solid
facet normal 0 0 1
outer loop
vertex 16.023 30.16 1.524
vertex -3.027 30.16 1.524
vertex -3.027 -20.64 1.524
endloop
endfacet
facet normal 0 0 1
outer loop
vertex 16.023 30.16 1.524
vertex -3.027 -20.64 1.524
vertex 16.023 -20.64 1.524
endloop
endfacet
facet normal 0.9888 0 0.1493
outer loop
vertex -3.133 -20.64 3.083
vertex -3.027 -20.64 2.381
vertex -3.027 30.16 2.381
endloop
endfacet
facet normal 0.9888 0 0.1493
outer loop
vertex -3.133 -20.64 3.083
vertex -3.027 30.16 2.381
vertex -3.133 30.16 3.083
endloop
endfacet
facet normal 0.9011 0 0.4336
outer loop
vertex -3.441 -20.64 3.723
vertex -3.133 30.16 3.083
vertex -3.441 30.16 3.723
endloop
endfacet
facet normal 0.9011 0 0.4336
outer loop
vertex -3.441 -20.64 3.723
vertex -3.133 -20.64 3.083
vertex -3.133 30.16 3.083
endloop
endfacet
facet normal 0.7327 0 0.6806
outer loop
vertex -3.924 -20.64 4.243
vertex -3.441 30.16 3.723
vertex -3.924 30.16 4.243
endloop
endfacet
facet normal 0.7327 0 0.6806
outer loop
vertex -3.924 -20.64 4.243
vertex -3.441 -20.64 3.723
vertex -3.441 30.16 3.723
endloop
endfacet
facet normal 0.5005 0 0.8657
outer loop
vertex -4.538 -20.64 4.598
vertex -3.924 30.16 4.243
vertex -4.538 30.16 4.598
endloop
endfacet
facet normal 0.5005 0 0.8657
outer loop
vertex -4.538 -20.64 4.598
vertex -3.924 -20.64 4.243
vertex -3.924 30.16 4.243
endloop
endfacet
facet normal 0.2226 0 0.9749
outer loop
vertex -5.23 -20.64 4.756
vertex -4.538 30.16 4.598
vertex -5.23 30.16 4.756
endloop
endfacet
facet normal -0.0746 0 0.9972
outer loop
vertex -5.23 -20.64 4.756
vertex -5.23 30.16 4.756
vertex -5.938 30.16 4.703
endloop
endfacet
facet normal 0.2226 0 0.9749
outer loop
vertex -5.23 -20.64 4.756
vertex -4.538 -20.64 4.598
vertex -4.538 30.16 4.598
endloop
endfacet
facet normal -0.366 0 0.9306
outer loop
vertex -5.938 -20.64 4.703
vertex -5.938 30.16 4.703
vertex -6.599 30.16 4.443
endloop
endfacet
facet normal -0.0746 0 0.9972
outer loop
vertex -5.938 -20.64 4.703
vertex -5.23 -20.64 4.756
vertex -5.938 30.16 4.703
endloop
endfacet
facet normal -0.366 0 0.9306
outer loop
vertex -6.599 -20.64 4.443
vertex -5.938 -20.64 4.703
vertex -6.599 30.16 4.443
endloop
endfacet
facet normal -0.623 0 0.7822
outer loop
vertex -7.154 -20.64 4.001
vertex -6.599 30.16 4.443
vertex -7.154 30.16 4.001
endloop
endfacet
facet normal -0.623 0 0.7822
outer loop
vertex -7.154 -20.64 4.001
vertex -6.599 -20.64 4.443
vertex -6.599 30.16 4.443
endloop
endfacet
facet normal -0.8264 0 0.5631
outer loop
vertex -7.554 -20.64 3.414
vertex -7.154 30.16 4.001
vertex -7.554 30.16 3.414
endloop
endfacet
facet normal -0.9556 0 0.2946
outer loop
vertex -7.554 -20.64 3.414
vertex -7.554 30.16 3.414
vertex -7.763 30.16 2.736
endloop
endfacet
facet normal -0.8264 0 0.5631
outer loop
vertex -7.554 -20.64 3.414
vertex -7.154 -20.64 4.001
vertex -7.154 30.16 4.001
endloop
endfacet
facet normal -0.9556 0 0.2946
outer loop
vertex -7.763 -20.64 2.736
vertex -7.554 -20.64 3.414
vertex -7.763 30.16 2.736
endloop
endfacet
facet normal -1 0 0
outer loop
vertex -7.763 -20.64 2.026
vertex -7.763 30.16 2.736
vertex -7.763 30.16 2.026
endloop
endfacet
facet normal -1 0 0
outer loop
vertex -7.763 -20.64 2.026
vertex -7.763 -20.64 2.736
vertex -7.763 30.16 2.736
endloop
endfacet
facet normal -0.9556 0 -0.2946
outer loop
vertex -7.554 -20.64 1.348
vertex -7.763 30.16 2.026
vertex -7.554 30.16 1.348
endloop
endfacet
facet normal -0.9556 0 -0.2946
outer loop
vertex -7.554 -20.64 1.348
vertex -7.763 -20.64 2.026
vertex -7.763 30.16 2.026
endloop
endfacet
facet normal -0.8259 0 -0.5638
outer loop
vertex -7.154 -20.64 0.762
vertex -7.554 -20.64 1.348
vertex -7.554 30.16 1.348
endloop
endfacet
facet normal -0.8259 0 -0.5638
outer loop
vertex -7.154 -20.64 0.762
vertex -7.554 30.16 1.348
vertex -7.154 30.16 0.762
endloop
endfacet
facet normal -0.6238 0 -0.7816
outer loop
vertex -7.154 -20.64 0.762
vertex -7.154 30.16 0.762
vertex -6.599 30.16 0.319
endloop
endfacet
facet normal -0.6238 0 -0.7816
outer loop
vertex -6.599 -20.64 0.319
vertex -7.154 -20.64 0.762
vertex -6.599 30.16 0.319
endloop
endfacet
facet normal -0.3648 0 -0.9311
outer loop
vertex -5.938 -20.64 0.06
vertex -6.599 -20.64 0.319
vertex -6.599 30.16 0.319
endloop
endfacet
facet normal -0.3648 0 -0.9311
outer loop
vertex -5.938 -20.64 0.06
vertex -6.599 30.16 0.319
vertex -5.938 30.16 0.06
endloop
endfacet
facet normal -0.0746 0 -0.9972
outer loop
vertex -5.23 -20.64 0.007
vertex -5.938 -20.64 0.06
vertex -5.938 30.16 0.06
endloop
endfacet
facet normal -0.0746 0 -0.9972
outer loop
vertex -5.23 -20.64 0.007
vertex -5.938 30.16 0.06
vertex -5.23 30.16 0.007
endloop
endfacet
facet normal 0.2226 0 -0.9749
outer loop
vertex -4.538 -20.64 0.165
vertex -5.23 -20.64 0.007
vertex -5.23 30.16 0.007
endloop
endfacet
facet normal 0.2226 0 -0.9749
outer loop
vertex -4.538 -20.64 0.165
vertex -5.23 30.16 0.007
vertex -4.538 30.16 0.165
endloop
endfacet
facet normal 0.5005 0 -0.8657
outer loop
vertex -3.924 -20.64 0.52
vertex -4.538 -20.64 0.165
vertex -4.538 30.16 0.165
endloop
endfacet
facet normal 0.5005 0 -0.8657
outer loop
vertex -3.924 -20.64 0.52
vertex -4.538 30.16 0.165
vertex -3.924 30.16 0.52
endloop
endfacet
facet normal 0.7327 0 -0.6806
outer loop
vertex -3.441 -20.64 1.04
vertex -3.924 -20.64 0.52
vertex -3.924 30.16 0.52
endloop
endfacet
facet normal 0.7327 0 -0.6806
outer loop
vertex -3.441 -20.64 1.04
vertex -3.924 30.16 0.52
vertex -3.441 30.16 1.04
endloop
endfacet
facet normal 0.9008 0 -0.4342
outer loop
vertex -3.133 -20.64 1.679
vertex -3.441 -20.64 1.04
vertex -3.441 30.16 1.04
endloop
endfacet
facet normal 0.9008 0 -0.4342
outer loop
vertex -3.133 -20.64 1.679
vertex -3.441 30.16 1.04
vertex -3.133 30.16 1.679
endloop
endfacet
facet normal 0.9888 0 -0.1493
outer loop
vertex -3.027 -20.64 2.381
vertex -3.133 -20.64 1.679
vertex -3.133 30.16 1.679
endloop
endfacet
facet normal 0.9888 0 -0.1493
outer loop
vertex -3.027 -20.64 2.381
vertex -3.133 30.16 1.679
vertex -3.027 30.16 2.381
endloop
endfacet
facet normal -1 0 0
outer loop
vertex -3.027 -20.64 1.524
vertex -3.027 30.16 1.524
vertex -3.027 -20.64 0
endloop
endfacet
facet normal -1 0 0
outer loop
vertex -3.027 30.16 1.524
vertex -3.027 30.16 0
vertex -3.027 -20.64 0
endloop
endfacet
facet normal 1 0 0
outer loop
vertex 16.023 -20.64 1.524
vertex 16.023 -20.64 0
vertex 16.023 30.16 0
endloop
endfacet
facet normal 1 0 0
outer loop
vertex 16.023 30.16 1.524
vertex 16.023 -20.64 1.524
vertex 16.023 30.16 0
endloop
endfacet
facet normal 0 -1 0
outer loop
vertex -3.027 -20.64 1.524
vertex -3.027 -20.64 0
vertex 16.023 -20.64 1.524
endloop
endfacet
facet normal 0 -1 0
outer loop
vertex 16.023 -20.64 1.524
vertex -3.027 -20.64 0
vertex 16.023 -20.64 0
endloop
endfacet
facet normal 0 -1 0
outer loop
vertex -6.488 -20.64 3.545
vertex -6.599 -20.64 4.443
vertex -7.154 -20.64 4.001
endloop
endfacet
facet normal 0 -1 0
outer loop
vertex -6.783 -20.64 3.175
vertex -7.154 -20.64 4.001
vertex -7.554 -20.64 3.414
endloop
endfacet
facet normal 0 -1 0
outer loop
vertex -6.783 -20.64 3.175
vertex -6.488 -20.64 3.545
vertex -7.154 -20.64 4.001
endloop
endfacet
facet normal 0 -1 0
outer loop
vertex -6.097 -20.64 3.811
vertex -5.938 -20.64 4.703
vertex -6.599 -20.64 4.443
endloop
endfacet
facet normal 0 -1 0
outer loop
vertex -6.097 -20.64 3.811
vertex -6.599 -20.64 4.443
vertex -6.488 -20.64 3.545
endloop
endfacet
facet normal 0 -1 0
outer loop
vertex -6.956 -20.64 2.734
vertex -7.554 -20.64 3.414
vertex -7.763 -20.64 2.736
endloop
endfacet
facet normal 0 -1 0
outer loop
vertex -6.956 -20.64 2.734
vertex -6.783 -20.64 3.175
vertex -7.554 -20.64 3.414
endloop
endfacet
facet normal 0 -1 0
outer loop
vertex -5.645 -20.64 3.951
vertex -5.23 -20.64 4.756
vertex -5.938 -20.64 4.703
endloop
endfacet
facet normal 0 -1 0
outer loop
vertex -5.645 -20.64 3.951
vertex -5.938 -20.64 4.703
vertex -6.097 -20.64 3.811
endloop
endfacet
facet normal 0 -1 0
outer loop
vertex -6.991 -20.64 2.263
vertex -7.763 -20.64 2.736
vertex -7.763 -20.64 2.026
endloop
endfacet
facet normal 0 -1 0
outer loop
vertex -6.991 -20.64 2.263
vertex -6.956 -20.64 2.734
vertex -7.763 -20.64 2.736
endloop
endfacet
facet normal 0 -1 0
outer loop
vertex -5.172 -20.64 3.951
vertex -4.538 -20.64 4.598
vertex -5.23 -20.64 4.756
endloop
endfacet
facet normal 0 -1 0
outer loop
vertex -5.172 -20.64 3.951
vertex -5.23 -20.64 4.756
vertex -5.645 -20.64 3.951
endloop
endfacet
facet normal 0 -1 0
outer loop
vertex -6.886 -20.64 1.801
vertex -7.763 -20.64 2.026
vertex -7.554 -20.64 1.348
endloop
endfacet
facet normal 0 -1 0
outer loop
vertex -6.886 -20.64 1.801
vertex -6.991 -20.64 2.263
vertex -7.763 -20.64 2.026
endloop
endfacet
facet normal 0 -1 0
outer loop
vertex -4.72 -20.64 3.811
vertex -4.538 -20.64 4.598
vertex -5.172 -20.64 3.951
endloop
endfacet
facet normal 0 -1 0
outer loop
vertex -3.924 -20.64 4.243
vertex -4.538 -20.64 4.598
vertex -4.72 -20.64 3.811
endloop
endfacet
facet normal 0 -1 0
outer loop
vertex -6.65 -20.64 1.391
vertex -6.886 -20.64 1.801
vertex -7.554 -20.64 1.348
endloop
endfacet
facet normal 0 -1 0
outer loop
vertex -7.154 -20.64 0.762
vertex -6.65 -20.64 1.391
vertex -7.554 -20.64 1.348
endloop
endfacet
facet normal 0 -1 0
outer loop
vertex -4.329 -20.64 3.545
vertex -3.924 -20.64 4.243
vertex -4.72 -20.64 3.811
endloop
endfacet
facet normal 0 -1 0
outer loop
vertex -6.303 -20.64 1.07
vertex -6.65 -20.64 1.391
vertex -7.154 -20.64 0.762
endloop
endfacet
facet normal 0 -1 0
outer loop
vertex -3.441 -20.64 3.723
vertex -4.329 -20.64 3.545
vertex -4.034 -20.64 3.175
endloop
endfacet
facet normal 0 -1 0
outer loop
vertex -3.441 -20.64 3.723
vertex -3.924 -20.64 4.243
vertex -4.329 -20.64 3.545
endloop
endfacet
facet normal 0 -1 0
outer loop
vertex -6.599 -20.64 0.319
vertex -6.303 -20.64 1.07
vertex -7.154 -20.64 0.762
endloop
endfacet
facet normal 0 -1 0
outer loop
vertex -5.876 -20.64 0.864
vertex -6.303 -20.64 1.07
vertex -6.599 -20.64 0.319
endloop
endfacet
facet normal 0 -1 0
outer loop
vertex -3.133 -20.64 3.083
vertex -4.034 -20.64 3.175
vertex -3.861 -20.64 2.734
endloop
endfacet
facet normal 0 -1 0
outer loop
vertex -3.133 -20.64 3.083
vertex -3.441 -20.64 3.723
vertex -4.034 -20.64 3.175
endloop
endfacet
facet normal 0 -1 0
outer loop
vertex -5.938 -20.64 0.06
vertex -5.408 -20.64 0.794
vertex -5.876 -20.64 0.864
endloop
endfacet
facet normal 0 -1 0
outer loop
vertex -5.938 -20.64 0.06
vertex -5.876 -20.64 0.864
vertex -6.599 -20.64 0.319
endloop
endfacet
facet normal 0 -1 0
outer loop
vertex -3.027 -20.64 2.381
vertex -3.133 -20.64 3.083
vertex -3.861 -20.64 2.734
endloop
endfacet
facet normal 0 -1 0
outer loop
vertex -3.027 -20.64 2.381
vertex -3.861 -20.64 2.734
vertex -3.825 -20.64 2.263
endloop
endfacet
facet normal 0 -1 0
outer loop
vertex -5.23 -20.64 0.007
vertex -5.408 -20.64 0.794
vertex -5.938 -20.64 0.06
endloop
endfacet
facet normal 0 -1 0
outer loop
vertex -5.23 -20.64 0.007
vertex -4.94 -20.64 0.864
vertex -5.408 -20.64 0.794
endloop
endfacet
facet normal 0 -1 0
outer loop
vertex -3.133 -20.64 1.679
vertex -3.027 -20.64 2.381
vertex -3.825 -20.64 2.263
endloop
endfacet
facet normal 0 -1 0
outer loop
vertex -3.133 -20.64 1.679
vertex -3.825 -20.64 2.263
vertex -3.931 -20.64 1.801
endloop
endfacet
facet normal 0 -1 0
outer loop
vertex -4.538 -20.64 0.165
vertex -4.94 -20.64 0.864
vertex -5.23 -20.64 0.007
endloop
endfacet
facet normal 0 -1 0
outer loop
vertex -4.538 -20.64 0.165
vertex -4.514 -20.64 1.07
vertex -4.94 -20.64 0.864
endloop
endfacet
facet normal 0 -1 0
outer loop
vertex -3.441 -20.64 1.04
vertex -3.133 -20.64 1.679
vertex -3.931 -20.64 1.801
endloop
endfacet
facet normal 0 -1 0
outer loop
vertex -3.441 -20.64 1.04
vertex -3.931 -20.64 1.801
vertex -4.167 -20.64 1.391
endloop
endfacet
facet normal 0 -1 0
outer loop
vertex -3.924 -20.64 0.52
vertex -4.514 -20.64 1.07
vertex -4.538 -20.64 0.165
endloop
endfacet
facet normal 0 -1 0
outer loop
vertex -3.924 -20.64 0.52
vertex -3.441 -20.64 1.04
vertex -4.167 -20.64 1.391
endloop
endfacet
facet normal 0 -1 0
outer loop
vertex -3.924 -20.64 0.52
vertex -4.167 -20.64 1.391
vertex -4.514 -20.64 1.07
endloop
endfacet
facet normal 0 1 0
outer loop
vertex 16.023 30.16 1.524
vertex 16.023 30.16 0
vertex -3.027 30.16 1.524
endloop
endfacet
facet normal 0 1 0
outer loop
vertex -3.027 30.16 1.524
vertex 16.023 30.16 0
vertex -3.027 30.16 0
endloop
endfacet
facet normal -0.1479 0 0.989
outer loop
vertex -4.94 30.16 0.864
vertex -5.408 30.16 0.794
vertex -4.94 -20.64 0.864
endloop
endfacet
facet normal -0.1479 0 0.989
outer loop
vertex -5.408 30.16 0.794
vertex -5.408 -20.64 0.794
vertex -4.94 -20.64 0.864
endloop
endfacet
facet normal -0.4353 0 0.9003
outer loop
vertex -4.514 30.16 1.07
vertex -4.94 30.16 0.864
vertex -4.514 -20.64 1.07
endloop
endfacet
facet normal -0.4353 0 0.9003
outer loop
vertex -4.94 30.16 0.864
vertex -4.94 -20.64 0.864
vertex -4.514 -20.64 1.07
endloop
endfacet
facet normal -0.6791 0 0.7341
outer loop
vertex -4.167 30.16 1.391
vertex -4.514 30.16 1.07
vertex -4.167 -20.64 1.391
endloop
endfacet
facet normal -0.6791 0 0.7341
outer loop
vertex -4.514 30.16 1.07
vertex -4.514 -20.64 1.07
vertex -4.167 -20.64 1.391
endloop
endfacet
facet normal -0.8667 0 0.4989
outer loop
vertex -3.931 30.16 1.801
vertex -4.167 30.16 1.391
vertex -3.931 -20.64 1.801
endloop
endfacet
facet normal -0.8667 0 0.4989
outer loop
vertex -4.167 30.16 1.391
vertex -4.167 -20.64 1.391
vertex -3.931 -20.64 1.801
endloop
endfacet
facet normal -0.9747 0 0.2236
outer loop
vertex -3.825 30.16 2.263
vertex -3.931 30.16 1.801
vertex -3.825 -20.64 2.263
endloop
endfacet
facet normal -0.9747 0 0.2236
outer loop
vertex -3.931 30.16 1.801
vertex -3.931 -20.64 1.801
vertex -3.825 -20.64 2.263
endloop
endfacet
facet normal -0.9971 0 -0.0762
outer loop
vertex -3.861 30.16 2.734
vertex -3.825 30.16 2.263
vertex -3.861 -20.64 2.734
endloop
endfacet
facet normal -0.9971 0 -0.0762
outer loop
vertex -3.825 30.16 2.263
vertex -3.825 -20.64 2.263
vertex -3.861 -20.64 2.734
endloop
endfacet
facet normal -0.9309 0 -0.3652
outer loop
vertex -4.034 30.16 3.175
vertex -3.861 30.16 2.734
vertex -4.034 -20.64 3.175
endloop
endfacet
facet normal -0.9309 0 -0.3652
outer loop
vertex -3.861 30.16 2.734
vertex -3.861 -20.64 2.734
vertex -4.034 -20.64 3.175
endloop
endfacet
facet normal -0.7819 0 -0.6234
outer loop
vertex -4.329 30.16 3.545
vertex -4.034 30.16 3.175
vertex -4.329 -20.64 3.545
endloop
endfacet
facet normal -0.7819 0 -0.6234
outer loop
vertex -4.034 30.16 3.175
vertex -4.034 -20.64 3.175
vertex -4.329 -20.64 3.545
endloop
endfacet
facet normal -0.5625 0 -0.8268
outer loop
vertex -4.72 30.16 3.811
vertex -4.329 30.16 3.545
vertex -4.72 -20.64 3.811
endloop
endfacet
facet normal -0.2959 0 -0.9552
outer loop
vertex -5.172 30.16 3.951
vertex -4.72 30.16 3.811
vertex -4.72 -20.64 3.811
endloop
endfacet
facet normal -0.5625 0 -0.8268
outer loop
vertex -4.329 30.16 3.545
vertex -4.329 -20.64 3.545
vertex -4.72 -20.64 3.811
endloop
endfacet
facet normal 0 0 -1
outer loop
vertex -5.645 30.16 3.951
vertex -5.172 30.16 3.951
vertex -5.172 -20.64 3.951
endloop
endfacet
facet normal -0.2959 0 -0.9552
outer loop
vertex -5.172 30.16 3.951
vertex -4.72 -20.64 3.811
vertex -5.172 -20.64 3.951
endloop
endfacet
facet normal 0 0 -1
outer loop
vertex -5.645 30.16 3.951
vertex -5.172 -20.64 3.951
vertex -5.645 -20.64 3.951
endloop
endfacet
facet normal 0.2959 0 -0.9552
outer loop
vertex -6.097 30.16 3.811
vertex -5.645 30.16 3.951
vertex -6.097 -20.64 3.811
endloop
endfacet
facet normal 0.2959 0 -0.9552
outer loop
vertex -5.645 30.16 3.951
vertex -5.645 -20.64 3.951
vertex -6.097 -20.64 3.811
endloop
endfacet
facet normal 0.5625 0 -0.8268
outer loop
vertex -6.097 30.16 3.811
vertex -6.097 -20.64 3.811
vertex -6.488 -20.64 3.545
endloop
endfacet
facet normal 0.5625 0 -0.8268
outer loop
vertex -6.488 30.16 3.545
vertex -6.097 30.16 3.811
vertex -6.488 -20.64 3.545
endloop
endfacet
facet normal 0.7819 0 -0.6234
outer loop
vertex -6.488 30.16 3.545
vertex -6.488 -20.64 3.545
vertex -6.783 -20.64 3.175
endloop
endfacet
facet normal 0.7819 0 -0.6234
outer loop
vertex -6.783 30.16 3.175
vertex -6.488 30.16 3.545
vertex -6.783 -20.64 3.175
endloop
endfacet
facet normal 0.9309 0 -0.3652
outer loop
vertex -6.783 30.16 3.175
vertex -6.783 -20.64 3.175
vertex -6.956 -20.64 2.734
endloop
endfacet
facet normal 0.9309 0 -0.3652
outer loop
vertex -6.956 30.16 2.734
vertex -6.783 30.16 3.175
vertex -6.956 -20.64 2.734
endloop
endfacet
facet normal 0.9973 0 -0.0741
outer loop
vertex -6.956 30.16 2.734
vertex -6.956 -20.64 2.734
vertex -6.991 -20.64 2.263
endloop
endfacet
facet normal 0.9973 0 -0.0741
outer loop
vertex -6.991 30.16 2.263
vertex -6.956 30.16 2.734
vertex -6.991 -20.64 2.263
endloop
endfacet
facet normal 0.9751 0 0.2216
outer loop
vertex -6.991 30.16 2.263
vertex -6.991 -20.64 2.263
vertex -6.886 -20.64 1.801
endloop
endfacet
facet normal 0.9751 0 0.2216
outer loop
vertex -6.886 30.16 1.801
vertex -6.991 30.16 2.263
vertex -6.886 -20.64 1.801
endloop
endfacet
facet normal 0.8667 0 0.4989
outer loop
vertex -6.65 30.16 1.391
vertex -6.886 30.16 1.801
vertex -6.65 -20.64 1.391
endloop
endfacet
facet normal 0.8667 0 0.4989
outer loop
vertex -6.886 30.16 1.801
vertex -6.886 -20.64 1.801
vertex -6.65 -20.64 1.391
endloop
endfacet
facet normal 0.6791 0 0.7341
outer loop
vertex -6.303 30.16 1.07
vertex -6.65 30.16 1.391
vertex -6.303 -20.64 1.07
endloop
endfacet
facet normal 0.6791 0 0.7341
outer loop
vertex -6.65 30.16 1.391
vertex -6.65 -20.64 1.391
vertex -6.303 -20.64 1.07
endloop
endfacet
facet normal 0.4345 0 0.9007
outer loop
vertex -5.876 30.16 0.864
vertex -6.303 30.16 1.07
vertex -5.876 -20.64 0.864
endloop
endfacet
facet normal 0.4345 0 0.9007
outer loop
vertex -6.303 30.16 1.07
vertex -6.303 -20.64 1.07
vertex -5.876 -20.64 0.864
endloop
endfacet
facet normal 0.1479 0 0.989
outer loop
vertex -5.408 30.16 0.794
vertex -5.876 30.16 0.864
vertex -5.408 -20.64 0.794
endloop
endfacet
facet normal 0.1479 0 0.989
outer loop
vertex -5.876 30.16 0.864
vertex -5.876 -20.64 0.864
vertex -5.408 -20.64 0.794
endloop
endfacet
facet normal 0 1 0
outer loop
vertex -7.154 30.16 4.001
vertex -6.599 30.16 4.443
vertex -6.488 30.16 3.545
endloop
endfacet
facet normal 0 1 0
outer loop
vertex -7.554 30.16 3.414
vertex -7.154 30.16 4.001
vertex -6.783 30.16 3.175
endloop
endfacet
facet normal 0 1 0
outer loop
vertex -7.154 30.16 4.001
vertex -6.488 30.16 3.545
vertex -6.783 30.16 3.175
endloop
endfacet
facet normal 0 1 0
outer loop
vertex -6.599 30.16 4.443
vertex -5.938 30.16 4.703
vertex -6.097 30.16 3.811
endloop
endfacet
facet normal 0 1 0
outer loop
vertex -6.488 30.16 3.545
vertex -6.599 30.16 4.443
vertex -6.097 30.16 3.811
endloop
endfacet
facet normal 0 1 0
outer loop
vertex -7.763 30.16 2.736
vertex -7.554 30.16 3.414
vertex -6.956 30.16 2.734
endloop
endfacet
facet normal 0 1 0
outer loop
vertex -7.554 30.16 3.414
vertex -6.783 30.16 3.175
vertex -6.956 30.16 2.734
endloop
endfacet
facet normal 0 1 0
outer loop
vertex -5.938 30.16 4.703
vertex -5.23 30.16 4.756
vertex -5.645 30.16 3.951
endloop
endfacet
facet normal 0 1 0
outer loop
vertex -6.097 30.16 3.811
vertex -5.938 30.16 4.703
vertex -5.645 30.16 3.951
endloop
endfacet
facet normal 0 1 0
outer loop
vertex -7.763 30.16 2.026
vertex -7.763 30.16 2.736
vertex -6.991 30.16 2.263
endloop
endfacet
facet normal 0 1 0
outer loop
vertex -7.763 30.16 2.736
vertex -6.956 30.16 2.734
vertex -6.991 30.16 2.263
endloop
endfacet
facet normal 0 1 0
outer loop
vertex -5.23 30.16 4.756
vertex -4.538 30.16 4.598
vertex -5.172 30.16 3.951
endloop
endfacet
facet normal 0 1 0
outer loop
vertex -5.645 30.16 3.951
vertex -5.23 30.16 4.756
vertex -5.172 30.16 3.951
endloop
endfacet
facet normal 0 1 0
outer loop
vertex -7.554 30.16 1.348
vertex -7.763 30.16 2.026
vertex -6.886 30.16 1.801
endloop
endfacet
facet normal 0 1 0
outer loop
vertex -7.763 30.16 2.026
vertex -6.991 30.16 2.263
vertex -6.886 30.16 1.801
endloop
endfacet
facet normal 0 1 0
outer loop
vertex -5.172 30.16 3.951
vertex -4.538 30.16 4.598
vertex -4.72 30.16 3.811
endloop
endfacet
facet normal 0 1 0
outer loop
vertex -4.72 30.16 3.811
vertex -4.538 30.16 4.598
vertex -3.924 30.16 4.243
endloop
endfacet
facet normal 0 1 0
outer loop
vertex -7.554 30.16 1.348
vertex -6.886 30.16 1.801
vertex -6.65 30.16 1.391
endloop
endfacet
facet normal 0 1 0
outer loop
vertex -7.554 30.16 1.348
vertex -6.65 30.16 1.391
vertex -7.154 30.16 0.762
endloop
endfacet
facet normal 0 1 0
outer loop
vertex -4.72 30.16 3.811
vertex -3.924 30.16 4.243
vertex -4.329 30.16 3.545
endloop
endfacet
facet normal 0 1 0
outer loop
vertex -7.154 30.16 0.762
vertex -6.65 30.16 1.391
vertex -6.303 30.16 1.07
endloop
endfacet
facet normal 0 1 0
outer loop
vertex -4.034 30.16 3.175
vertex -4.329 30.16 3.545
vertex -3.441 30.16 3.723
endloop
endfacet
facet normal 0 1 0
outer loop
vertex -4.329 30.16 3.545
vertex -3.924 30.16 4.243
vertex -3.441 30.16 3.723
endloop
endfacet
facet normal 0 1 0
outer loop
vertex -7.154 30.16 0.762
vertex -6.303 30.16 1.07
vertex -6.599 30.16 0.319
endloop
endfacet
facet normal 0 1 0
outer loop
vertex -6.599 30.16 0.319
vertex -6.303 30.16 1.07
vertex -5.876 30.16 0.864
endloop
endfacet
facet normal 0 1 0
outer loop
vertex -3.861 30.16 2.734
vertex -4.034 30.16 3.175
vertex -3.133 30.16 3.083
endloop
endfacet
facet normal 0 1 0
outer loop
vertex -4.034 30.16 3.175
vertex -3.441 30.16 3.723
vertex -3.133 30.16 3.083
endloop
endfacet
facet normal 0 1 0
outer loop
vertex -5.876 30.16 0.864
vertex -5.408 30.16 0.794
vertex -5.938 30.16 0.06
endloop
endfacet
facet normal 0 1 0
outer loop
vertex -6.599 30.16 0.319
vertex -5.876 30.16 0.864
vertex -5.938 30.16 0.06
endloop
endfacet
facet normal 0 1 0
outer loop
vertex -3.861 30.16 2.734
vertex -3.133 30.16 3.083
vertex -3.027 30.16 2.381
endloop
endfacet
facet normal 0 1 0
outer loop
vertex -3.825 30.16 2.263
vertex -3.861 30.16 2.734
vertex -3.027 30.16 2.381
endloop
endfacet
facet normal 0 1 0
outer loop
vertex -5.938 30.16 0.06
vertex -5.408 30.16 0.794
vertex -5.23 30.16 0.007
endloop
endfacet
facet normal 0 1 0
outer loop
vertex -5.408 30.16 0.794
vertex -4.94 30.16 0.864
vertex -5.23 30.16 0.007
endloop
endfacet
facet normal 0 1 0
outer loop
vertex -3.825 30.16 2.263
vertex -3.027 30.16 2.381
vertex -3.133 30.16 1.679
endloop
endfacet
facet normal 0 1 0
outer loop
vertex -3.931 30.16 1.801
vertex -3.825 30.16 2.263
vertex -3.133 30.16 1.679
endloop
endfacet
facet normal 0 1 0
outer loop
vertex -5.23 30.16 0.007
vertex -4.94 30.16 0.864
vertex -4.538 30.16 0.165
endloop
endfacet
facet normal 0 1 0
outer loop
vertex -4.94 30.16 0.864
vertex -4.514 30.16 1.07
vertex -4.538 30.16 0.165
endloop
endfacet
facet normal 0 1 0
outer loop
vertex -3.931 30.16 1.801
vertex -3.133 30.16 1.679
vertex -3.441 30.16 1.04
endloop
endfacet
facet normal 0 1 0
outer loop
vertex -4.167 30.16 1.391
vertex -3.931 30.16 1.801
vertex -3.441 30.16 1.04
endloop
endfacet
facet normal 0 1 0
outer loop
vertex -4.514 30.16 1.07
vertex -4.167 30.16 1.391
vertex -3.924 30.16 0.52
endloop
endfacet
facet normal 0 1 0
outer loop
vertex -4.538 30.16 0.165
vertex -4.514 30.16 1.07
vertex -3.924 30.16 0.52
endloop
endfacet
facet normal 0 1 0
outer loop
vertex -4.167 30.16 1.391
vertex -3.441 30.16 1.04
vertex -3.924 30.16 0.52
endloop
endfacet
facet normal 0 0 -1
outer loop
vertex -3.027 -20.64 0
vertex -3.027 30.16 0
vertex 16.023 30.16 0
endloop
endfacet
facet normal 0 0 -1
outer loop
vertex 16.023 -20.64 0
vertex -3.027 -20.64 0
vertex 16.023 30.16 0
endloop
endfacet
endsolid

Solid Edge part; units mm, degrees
sketch "Sketch1" plane through (0, 0, 0) normal (0, 0, 1) x (1, 0, 0)
  line L0 (-3.0271, -20.6395) -> (16.0229, -20.6395)
  line L1 (16.0229, -20.6395) -> (16.0229, 30.1605)
  line L2 (16.0229, 30.1605) -> (-3.0271, 30.1605)
  line L3 (-3.0271, 30.1605) -> (-3.0271, -20.6395)
  dimension "D1" = 50.8
  dimension "D2" = 19.05
extrude "Protrusion1" add sketch "Sketch1" along normal blind 1.524
sketch "Sketch2" plane through (8.0854, -20.6395, 0.762) normal (0, -1, 0) x (1, 0, 0)
  circle A0 centre (-13.4937, 1.6192) radius 2.3812
  dimension "D1" = 4.7625
extrude "ExtrudedProtrusion_2" add sketch "Sketch2" against normal blind 50.8
hole "Hole_1" at (-5.4084, -20.6395, 2.3812) direction (0, 1, 0) diameter 3.175 end up to next
properties part number "16175A181"
